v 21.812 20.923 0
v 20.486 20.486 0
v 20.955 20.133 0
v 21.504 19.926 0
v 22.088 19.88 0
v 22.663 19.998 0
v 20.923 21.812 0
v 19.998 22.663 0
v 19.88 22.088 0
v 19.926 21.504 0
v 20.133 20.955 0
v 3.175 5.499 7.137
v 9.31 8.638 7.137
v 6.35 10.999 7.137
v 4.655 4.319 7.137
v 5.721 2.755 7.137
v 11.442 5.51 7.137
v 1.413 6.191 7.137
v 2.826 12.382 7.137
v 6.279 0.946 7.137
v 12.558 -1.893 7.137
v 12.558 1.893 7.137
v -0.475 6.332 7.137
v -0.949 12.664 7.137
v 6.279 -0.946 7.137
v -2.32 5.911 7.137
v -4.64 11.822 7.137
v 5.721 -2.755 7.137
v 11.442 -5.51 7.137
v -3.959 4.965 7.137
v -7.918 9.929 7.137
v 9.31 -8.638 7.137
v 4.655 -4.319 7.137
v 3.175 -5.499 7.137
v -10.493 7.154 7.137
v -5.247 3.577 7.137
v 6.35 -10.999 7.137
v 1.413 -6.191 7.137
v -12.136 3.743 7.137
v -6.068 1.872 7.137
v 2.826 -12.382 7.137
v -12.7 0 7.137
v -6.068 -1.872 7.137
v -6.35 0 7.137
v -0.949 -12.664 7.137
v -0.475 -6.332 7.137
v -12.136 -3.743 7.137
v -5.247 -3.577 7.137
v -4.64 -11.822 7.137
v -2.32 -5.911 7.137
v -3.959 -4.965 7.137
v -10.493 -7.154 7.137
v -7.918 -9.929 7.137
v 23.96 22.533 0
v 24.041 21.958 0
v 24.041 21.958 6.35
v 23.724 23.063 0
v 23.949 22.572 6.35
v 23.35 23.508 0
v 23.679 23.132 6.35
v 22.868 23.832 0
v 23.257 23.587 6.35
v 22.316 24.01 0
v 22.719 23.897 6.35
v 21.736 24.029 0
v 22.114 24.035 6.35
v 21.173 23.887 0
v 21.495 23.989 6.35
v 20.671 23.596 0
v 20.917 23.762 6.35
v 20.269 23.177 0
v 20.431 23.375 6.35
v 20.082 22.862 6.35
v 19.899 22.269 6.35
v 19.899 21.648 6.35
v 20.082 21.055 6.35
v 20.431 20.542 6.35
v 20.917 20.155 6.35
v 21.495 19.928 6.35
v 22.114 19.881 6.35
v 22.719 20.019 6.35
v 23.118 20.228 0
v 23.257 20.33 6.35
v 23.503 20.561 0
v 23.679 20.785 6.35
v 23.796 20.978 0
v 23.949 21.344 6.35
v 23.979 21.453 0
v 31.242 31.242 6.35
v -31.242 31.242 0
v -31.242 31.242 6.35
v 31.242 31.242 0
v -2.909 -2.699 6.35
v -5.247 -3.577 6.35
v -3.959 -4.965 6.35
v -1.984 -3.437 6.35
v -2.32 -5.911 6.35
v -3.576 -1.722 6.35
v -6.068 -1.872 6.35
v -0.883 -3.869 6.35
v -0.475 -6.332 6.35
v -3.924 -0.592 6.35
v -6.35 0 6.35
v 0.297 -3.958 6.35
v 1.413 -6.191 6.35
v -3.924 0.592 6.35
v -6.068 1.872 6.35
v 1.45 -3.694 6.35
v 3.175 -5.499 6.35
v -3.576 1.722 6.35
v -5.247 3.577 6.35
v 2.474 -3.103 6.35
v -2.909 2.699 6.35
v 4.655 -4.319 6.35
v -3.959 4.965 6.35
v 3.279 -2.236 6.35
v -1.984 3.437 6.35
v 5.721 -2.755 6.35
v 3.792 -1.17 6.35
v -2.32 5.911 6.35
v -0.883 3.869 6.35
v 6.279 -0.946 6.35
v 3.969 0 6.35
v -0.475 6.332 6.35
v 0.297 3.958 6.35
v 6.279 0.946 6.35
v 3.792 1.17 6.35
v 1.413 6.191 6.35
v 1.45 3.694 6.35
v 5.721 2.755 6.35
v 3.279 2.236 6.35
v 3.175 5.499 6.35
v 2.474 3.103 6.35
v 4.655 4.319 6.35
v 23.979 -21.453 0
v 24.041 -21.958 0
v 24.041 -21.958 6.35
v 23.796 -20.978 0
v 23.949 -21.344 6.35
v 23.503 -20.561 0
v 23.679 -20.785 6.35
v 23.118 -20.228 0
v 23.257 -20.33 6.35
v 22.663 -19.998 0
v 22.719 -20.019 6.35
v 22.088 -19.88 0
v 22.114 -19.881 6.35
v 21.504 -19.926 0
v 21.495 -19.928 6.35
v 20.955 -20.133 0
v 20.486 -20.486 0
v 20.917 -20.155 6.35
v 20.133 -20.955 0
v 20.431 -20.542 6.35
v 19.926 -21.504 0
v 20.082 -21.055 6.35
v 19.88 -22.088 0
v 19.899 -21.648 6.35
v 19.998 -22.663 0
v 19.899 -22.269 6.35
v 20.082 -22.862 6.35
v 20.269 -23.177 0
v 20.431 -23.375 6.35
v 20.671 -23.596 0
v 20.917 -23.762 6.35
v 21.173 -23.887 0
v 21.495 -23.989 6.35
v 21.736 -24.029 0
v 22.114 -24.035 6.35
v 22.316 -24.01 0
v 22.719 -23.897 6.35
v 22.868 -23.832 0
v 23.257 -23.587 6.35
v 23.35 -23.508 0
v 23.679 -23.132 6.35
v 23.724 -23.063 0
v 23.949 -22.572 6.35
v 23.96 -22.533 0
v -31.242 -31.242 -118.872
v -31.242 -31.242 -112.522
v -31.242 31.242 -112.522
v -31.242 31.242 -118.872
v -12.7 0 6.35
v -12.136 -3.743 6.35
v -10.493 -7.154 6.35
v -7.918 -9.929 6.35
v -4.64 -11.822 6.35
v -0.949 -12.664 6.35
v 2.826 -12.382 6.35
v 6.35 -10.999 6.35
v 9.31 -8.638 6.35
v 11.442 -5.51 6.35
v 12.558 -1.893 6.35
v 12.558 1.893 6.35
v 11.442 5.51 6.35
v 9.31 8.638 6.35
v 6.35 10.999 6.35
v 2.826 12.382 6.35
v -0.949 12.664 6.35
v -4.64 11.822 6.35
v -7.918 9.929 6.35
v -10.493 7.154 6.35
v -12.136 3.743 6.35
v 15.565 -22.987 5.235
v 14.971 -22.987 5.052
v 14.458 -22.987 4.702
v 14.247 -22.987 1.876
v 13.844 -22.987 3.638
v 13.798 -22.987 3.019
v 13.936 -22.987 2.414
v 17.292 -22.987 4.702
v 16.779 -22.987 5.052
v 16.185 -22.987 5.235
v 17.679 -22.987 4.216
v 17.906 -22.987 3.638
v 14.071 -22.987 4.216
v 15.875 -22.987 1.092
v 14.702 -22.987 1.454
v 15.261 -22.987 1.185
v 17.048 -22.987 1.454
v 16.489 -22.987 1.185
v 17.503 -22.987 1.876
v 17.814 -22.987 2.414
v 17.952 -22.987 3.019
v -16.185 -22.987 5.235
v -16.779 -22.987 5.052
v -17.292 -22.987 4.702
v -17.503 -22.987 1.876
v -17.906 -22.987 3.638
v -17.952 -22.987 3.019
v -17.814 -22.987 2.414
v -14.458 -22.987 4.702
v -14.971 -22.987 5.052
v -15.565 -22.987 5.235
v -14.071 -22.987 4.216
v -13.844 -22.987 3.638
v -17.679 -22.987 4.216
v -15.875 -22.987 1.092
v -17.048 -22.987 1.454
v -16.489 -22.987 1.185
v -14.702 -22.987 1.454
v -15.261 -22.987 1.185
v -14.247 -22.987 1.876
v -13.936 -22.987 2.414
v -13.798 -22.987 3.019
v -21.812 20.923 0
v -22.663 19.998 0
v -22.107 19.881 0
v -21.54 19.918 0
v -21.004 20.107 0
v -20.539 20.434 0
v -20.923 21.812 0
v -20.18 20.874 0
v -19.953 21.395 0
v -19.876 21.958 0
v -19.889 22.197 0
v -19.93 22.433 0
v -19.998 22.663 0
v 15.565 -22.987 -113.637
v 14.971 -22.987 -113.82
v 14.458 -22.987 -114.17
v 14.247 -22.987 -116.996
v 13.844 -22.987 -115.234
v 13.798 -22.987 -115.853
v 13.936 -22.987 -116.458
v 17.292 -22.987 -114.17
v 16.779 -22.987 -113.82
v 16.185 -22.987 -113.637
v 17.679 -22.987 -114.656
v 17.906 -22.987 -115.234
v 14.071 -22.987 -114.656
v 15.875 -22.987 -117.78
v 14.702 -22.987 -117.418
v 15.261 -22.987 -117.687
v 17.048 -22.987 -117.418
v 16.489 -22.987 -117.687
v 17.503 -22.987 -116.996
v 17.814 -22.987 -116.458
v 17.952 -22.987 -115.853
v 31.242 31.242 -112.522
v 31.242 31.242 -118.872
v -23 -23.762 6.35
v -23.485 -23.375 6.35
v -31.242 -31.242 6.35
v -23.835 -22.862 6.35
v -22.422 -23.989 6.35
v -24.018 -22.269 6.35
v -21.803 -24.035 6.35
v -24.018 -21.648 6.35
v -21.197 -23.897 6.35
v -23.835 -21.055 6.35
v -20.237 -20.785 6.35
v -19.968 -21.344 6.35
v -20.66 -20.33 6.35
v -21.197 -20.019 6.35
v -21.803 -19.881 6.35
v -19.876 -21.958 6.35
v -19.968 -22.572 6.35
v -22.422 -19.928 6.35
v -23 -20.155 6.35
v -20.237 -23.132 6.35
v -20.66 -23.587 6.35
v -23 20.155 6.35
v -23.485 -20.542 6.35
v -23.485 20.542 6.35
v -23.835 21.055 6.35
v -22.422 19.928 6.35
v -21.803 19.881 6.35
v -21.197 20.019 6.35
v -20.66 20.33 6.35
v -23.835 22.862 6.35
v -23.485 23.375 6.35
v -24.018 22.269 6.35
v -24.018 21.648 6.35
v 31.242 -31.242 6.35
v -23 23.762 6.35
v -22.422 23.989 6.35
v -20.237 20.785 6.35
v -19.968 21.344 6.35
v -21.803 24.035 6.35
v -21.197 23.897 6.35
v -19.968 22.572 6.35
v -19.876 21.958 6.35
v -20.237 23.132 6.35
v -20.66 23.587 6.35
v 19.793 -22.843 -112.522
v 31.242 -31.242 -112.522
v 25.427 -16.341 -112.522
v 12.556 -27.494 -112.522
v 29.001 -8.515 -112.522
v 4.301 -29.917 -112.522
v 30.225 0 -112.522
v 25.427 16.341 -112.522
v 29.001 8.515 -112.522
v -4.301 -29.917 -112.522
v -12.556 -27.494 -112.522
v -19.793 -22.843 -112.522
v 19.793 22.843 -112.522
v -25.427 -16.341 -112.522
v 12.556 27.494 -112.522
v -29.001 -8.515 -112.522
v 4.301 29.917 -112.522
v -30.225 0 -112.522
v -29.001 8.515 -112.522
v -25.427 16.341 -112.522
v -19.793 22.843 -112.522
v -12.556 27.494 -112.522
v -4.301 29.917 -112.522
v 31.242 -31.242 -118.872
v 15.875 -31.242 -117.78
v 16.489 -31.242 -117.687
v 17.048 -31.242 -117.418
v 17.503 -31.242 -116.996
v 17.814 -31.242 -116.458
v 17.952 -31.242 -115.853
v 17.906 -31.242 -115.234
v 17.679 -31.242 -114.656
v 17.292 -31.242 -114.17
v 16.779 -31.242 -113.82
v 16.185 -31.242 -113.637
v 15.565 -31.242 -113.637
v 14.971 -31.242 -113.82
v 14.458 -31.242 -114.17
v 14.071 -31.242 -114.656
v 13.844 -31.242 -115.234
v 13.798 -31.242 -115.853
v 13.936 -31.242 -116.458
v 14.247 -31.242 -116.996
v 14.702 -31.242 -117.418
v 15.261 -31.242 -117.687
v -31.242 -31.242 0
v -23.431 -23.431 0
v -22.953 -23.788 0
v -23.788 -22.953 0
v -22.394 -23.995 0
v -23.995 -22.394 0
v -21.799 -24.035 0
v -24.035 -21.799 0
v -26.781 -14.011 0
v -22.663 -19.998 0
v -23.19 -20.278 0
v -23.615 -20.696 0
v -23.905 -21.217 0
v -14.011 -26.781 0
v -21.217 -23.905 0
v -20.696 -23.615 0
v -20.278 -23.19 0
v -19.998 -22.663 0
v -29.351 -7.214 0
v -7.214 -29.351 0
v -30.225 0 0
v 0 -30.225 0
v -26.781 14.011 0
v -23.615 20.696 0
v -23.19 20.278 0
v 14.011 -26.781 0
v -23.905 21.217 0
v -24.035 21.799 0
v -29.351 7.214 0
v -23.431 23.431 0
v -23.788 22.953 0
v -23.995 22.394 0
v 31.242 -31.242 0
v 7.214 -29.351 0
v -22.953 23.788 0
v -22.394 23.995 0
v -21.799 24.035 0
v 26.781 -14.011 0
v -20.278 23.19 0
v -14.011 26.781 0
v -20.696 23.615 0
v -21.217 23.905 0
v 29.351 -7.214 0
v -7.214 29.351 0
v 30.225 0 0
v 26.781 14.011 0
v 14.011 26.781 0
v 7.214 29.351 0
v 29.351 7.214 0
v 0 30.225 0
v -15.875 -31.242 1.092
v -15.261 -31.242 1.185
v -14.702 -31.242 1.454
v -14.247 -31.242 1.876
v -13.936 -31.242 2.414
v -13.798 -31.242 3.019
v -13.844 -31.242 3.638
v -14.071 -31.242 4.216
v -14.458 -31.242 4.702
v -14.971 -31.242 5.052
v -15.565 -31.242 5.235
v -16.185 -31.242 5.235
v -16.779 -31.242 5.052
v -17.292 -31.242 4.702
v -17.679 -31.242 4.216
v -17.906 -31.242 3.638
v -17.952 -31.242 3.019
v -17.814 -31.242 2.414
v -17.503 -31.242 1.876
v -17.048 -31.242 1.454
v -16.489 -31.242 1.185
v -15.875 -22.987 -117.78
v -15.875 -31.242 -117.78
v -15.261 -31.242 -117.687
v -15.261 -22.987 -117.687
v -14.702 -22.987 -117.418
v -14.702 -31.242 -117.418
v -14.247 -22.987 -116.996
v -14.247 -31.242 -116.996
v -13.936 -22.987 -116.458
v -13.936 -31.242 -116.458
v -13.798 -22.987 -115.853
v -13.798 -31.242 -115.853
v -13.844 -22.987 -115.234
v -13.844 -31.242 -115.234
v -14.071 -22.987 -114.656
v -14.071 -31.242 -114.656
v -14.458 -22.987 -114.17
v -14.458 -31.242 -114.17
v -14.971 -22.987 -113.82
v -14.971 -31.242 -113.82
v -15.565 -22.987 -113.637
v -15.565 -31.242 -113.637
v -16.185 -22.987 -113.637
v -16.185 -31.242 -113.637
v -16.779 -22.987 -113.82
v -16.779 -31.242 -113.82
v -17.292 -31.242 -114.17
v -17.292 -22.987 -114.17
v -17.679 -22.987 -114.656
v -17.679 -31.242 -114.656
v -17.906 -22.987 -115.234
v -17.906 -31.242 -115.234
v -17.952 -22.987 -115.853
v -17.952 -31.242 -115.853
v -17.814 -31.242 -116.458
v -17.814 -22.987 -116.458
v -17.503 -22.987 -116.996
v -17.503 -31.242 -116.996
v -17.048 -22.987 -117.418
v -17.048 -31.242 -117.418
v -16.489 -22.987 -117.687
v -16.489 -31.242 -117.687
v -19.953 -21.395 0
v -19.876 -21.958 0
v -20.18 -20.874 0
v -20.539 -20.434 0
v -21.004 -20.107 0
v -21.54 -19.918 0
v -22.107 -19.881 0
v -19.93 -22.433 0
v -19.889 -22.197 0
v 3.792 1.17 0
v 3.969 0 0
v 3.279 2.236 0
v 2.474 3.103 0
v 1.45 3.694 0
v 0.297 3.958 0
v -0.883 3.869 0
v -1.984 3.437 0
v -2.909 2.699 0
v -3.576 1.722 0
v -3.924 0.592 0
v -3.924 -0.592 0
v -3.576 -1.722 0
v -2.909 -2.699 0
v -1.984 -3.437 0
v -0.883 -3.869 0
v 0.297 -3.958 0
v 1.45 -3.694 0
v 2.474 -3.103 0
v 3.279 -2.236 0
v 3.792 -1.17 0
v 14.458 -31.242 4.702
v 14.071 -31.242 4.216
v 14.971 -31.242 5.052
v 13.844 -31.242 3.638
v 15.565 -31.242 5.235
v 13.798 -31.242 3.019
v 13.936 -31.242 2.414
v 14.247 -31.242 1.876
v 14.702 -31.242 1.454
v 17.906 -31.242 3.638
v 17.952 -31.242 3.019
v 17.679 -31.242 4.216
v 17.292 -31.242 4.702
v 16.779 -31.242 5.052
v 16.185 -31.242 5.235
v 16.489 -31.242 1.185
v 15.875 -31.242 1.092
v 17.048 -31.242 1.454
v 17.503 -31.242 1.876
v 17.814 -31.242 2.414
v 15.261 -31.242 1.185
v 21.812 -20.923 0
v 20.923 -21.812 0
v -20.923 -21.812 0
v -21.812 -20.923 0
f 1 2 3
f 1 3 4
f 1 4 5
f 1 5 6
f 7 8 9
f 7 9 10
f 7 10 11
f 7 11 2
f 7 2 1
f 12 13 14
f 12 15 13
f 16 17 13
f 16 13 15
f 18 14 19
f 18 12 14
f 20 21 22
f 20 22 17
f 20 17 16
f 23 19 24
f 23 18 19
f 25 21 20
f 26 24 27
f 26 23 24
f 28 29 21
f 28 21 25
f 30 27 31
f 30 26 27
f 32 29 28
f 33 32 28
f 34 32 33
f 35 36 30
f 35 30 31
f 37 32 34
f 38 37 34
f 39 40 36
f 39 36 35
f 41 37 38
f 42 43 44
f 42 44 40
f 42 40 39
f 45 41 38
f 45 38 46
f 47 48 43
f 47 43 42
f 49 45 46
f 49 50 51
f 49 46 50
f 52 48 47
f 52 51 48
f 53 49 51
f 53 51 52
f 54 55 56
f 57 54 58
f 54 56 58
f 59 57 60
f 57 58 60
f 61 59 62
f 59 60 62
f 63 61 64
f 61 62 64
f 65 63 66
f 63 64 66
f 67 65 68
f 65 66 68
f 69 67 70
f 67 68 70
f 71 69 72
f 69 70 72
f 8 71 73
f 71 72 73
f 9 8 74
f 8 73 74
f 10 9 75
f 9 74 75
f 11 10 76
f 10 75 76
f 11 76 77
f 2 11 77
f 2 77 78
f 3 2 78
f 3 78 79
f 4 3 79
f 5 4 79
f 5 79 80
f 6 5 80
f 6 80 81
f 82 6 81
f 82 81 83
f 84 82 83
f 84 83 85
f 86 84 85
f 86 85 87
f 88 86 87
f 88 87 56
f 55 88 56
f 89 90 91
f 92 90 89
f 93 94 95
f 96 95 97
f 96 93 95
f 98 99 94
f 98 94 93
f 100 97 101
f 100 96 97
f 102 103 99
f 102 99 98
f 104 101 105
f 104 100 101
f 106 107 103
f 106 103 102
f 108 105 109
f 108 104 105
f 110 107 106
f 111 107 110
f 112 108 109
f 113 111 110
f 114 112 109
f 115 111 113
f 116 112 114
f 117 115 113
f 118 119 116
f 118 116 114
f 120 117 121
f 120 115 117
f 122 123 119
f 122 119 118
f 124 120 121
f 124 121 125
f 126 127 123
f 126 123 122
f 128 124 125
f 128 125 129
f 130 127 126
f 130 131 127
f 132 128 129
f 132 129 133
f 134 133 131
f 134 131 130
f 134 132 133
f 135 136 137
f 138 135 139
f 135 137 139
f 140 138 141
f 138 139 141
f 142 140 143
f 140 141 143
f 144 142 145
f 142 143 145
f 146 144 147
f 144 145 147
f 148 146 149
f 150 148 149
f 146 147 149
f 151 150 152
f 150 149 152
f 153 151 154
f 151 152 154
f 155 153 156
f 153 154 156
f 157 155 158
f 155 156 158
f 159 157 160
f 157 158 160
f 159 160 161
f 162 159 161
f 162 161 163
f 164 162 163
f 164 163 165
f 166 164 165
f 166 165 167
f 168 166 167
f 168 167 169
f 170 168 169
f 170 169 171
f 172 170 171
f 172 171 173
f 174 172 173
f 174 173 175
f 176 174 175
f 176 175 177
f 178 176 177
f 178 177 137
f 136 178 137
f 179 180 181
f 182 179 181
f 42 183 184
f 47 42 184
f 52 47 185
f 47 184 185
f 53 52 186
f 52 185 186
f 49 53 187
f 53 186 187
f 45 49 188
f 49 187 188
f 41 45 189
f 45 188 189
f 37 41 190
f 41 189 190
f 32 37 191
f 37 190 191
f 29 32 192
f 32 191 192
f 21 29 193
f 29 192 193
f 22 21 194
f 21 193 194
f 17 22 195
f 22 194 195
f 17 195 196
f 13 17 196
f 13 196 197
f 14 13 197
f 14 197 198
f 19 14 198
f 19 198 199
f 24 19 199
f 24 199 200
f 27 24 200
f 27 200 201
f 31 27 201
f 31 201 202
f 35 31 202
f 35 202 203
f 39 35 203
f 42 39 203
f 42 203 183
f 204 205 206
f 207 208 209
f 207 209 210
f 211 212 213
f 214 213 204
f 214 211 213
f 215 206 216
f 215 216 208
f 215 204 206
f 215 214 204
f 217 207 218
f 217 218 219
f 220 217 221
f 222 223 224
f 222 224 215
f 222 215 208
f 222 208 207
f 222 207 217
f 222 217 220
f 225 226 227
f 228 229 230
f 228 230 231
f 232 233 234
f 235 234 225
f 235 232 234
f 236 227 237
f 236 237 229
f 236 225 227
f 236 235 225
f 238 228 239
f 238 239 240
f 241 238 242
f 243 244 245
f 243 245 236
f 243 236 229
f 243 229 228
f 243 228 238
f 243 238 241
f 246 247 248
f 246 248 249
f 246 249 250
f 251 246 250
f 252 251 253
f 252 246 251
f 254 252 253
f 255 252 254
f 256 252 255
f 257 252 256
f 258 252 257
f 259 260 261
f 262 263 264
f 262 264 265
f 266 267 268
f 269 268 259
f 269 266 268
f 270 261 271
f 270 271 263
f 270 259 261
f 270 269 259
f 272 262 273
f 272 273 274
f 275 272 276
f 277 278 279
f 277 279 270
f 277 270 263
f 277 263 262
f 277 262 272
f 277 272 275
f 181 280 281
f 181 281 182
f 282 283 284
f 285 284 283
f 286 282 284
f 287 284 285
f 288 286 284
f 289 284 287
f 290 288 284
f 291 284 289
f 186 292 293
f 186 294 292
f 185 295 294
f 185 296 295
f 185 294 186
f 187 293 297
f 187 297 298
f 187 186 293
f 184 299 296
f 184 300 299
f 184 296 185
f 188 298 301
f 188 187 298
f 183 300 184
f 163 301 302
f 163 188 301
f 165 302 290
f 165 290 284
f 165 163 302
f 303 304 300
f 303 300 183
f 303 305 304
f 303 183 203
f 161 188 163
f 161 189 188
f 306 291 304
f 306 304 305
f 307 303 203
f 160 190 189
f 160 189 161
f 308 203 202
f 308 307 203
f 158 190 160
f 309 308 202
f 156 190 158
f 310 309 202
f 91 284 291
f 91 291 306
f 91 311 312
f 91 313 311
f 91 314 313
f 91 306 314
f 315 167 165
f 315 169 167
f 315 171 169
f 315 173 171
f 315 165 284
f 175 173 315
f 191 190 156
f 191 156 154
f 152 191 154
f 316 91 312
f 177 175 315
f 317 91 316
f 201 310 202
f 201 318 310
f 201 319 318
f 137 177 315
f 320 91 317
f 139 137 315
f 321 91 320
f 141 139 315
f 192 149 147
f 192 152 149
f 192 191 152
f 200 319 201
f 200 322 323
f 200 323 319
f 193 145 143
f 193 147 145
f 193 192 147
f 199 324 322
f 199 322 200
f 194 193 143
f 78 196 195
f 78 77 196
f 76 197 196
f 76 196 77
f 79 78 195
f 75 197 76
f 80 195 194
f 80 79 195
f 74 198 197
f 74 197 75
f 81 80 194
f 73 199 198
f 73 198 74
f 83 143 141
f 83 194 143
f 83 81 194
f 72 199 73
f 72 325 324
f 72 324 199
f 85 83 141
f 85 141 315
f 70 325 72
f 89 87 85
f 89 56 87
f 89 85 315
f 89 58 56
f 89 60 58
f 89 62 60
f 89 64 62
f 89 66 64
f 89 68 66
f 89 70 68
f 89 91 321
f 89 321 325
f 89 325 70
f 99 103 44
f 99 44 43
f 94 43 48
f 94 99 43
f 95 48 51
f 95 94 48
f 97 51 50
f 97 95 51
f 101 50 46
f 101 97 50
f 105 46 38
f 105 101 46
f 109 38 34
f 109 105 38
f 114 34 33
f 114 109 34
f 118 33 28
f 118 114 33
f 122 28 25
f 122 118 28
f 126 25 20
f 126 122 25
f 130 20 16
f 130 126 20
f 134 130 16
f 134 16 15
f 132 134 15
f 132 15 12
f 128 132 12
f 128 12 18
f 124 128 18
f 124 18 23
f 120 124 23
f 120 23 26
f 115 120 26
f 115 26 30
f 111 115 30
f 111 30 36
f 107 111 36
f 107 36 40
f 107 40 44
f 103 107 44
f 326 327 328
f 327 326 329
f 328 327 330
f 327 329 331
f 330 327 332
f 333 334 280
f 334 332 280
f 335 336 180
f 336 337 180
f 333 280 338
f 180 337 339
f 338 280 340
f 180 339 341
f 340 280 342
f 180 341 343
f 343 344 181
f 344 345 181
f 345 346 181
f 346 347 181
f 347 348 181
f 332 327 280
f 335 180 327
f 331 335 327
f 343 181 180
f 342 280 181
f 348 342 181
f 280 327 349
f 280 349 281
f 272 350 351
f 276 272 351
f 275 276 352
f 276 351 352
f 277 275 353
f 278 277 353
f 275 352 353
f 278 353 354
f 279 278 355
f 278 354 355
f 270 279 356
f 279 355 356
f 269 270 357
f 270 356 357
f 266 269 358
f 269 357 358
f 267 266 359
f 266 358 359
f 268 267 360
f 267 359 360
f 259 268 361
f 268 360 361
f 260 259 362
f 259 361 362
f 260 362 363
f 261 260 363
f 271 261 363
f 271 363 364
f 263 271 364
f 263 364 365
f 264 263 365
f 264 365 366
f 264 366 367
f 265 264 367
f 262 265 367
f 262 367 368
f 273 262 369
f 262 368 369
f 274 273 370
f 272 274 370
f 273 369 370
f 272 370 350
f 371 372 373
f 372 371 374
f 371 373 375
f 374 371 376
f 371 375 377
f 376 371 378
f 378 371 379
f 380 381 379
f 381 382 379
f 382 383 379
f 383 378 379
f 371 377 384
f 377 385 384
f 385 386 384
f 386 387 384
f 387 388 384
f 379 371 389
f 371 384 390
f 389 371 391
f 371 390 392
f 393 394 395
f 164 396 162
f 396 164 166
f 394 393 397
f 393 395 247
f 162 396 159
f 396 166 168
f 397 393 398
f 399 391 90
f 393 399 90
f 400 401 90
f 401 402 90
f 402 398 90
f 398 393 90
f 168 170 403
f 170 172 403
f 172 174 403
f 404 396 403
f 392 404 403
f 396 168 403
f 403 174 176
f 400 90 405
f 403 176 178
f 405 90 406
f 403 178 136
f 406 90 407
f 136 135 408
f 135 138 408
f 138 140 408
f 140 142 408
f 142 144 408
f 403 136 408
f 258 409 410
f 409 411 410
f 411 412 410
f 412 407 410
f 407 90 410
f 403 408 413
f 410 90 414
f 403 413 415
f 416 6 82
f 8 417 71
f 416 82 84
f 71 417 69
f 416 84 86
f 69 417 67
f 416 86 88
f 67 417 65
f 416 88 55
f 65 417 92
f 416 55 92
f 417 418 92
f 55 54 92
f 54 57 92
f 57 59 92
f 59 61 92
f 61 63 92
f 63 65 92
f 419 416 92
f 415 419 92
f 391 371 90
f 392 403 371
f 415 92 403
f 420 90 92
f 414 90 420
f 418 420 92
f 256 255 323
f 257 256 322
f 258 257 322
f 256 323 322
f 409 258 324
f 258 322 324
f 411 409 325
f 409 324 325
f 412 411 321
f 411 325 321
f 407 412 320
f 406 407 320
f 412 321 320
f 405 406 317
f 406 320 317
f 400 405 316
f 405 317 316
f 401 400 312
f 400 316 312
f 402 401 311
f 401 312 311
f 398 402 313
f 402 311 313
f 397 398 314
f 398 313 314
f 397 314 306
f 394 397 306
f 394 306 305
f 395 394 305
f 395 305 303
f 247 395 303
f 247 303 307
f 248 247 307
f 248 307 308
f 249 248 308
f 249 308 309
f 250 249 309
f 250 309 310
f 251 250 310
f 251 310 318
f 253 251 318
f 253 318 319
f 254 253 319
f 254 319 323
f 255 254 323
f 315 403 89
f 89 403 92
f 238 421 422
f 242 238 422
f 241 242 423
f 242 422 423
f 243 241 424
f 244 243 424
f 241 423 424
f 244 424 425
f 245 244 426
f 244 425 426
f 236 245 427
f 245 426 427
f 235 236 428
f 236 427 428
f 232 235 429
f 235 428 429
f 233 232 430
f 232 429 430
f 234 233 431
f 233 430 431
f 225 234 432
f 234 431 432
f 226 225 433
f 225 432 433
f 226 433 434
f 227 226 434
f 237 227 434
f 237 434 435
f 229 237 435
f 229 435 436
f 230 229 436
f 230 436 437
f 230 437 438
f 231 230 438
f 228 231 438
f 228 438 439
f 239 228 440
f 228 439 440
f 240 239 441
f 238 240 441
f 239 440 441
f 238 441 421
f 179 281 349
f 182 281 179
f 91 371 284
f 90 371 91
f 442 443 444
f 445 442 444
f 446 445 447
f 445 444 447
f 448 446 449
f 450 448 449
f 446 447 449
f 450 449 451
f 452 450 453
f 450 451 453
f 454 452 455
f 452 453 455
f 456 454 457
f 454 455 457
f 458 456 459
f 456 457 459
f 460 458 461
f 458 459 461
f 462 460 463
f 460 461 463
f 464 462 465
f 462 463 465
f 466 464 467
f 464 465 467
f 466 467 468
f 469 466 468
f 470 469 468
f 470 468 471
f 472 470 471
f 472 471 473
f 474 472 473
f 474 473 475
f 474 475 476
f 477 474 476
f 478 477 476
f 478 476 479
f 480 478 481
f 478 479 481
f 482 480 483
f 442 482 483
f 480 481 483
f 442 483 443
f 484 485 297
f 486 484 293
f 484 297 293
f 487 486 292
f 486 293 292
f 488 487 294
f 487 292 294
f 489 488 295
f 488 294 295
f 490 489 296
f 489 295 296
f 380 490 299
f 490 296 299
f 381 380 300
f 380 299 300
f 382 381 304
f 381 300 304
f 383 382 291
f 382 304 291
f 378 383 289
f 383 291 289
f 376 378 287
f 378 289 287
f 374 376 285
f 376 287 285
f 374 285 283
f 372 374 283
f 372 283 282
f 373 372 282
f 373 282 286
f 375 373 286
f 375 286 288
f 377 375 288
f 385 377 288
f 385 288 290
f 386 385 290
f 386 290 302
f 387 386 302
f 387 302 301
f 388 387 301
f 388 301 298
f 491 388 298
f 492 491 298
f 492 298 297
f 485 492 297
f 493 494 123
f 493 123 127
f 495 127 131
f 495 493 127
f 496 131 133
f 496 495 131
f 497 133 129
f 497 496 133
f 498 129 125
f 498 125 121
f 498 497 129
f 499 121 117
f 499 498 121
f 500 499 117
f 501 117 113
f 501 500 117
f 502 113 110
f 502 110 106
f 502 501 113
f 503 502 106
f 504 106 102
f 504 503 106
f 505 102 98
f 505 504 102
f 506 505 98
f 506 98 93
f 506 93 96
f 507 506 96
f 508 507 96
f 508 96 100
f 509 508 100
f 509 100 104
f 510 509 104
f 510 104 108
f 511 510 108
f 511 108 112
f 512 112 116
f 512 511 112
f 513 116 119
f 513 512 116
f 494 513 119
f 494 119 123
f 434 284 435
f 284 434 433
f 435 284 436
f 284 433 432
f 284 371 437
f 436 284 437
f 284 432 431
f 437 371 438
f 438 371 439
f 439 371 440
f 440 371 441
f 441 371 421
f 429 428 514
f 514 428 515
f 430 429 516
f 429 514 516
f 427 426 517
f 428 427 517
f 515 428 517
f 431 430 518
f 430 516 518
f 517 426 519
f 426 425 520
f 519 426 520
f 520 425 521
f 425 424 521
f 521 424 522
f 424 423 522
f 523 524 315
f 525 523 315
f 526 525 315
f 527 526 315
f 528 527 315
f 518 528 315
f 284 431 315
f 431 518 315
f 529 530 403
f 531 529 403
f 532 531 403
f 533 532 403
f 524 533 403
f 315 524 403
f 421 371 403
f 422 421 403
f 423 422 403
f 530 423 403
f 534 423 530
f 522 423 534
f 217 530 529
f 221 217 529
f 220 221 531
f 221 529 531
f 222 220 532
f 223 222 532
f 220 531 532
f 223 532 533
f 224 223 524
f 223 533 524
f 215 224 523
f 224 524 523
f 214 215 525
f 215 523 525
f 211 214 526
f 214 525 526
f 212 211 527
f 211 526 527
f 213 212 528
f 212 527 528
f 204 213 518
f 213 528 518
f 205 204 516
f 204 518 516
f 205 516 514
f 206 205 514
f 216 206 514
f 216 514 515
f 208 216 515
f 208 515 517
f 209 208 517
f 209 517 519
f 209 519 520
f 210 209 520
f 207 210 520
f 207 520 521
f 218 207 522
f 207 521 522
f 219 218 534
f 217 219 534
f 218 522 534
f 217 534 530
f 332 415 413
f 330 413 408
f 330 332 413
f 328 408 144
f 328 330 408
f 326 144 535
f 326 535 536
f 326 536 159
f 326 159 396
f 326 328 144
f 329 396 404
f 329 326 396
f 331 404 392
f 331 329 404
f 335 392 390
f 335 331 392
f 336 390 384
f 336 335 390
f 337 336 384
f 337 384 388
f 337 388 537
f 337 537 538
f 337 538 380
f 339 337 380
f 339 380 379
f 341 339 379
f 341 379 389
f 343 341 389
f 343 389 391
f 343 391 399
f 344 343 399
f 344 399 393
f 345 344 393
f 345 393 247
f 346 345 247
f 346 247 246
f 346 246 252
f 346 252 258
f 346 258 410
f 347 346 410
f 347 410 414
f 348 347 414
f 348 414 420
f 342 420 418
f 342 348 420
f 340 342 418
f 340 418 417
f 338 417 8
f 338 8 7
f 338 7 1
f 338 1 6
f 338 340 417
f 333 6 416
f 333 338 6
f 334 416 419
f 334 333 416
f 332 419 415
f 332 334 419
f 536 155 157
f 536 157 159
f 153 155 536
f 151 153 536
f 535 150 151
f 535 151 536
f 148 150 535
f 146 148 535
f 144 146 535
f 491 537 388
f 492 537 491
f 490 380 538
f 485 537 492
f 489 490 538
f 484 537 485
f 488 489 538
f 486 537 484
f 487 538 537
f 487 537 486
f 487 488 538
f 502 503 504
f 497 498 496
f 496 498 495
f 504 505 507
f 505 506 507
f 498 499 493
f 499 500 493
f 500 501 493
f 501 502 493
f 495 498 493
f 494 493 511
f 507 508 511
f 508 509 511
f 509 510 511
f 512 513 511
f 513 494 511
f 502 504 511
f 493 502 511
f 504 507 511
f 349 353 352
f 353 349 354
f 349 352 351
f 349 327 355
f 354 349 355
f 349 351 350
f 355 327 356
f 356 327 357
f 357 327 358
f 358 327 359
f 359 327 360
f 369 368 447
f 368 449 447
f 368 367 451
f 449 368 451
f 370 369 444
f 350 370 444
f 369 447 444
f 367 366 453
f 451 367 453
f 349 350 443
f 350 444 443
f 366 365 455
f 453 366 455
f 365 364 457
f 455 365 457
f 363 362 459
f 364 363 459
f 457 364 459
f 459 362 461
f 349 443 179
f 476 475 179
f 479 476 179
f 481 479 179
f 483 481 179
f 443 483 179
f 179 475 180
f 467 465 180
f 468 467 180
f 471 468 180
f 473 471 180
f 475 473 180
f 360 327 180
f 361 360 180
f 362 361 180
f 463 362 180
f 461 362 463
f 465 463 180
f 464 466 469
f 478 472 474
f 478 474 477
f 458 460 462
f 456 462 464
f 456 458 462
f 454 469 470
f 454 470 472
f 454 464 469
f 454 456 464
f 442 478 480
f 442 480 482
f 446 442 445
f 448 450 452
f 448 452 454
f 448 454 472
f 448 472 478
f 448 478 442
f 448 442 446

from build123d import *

# Parameters (mm, degrees)
SKETCH1_W            = 112.522
SKETCH1_H            = 30.225
SKETCH2_W            = 62.484
SKETCH2_H            = 62.484
SKETCH2_R            = 3.96875
BOSS_EXTRUDE1_DEPTH  = 6.35
SKETCH3_R            = 12.7
SKETCH3_R_2          = 6.35
BOSS_EXTRUDE2_DEPTH  = 7.1374
SKETCH4_W            = 62.484
SKETCH4_H            = 62.484
BOSS_EXTRUDE3_DEPTH  = 6.35
SKETCH5_R            = 2.0828
CUT_EXTRUDE1_DEPTH   = 8.255
LPATTERN1_COUNT      = 2
LPATTERN1_PITCH      = 118.872
SKETCH6_R            = 2.0828
CUT_EXTRUDE2_DEPTH   = 6.35
LPATTERN2_COUNT      = 2
LPATTERN2_PITCH      = 43.9166
LPATTERN2_COUNT_DIR2 = 2
LPATTERN2_PITCH_DIR2 = 43.9166


with BuildPart() as part:
    # Sketch1 → Revolve1 (revolve)
    with BuildSketch(Plane(origin=(0, 0, 0), x_dir=(0, 0, -1), z_dir=(1, 0, 0)), mode=Mode.PRIVATE) as revolve1_sk:
        with Locations((56.261, -15.1125)):
            Rectangle(SKETCH1_W, SKETCH1_H)
    revolve(revolve1_sk.sketch.rotate(Axis((0, 0, 17.588251134), (0, 0, -1)), 270), axis=Axis((0, 0, 17.588251134), (0, 0, -1)))

    # Sketch2 → Boss-Extrude1 (add)
    with BuildSketch(Plane.XY):
        Rectangle(SKETCH2_W, SKETCH2_H)
        Circle(SKETCH2_R, mode=Mode.SUBTRACT)
    extrude(amount=BOSS_EXTRUDE1_DEPTH)

    # Sketch3 → Boss-Extrude2 (add)
    with BuildSketch(Plane.XY):
        with Locations(Location((0, 0, 0), (0, 0, 180))):
            Circle(SKETCH3_R)
        with Locations(Location((0, 0, 0), (0, 0, 180))):
            Circle(SKETCH3_R_2, mode=Mode.SUBTRACT)
    extrude(amount=BOSS_EXTRUDE2_DEPTH)

    # Sketch4 → Boss-Extrude3 (add)
    with BuildSketch(Plane(origin=(0, 0, -112.522), x_dir=(-1, 0, 0), z_dir=(0, 0, -1))):
        Rectangle(SKETCH4_W, SKETCH4_H)
    extrude(amount=BOSS_EXTRUDE3_DEPTH)

    # Sketch5 → Cut-Extrude1 (cut)
    with BuildSketch(Plane.XZ.offset(31.242)):
        with Locations(Location((-15.875, 3.175, 0), (0, 0, 270))):
            Circle(SKETCH5_R)
        with Locations(Location((15.875, 3.175, 0), (0, 0, 270))):
            Circle(SKETCH5_R)
    cut_extrude1 = extrude(amount=-CUT_EXTRUDE1_DEPTH, mode=Mode.SUBTRACT)

    # LPattern1: Cut-Extrude1 ×2
    with Locations(*[(0, 0, -i * LPATTERN1_PITCH) for i in range(1, LPATTERN1_COUNT)]):
        add(cut_extrude1, mode=Mode.SUBTRACT)

    # Sketch6 → Cut-Extrude2 (cut)
    with BuildSketch(Plane.XY.offset(6.35)):
        with Locations((21.9583, -21.9583)):
            Circle(SKETCH6_R)
    cut_extrude2 = extrude(amount=-CUT_EXTRUDE2_DEPTH, mode=Mode.SUBTRACT)

    # LPattern2: Cut-Extrude2 2 × 2
    with Locations(*[(-j * LPATTERN2_PITCH_DIR2, i * LPATTERN2_PITCH, 0) for i in range(LPATTERN2_COUNT) for j in range(LPATTERN2_COUNT_DIR2) if (i, j) != (0, 0)]):
        add(cut_extrude2, mode=Mode.SUBTRACT)


solid = part.part
